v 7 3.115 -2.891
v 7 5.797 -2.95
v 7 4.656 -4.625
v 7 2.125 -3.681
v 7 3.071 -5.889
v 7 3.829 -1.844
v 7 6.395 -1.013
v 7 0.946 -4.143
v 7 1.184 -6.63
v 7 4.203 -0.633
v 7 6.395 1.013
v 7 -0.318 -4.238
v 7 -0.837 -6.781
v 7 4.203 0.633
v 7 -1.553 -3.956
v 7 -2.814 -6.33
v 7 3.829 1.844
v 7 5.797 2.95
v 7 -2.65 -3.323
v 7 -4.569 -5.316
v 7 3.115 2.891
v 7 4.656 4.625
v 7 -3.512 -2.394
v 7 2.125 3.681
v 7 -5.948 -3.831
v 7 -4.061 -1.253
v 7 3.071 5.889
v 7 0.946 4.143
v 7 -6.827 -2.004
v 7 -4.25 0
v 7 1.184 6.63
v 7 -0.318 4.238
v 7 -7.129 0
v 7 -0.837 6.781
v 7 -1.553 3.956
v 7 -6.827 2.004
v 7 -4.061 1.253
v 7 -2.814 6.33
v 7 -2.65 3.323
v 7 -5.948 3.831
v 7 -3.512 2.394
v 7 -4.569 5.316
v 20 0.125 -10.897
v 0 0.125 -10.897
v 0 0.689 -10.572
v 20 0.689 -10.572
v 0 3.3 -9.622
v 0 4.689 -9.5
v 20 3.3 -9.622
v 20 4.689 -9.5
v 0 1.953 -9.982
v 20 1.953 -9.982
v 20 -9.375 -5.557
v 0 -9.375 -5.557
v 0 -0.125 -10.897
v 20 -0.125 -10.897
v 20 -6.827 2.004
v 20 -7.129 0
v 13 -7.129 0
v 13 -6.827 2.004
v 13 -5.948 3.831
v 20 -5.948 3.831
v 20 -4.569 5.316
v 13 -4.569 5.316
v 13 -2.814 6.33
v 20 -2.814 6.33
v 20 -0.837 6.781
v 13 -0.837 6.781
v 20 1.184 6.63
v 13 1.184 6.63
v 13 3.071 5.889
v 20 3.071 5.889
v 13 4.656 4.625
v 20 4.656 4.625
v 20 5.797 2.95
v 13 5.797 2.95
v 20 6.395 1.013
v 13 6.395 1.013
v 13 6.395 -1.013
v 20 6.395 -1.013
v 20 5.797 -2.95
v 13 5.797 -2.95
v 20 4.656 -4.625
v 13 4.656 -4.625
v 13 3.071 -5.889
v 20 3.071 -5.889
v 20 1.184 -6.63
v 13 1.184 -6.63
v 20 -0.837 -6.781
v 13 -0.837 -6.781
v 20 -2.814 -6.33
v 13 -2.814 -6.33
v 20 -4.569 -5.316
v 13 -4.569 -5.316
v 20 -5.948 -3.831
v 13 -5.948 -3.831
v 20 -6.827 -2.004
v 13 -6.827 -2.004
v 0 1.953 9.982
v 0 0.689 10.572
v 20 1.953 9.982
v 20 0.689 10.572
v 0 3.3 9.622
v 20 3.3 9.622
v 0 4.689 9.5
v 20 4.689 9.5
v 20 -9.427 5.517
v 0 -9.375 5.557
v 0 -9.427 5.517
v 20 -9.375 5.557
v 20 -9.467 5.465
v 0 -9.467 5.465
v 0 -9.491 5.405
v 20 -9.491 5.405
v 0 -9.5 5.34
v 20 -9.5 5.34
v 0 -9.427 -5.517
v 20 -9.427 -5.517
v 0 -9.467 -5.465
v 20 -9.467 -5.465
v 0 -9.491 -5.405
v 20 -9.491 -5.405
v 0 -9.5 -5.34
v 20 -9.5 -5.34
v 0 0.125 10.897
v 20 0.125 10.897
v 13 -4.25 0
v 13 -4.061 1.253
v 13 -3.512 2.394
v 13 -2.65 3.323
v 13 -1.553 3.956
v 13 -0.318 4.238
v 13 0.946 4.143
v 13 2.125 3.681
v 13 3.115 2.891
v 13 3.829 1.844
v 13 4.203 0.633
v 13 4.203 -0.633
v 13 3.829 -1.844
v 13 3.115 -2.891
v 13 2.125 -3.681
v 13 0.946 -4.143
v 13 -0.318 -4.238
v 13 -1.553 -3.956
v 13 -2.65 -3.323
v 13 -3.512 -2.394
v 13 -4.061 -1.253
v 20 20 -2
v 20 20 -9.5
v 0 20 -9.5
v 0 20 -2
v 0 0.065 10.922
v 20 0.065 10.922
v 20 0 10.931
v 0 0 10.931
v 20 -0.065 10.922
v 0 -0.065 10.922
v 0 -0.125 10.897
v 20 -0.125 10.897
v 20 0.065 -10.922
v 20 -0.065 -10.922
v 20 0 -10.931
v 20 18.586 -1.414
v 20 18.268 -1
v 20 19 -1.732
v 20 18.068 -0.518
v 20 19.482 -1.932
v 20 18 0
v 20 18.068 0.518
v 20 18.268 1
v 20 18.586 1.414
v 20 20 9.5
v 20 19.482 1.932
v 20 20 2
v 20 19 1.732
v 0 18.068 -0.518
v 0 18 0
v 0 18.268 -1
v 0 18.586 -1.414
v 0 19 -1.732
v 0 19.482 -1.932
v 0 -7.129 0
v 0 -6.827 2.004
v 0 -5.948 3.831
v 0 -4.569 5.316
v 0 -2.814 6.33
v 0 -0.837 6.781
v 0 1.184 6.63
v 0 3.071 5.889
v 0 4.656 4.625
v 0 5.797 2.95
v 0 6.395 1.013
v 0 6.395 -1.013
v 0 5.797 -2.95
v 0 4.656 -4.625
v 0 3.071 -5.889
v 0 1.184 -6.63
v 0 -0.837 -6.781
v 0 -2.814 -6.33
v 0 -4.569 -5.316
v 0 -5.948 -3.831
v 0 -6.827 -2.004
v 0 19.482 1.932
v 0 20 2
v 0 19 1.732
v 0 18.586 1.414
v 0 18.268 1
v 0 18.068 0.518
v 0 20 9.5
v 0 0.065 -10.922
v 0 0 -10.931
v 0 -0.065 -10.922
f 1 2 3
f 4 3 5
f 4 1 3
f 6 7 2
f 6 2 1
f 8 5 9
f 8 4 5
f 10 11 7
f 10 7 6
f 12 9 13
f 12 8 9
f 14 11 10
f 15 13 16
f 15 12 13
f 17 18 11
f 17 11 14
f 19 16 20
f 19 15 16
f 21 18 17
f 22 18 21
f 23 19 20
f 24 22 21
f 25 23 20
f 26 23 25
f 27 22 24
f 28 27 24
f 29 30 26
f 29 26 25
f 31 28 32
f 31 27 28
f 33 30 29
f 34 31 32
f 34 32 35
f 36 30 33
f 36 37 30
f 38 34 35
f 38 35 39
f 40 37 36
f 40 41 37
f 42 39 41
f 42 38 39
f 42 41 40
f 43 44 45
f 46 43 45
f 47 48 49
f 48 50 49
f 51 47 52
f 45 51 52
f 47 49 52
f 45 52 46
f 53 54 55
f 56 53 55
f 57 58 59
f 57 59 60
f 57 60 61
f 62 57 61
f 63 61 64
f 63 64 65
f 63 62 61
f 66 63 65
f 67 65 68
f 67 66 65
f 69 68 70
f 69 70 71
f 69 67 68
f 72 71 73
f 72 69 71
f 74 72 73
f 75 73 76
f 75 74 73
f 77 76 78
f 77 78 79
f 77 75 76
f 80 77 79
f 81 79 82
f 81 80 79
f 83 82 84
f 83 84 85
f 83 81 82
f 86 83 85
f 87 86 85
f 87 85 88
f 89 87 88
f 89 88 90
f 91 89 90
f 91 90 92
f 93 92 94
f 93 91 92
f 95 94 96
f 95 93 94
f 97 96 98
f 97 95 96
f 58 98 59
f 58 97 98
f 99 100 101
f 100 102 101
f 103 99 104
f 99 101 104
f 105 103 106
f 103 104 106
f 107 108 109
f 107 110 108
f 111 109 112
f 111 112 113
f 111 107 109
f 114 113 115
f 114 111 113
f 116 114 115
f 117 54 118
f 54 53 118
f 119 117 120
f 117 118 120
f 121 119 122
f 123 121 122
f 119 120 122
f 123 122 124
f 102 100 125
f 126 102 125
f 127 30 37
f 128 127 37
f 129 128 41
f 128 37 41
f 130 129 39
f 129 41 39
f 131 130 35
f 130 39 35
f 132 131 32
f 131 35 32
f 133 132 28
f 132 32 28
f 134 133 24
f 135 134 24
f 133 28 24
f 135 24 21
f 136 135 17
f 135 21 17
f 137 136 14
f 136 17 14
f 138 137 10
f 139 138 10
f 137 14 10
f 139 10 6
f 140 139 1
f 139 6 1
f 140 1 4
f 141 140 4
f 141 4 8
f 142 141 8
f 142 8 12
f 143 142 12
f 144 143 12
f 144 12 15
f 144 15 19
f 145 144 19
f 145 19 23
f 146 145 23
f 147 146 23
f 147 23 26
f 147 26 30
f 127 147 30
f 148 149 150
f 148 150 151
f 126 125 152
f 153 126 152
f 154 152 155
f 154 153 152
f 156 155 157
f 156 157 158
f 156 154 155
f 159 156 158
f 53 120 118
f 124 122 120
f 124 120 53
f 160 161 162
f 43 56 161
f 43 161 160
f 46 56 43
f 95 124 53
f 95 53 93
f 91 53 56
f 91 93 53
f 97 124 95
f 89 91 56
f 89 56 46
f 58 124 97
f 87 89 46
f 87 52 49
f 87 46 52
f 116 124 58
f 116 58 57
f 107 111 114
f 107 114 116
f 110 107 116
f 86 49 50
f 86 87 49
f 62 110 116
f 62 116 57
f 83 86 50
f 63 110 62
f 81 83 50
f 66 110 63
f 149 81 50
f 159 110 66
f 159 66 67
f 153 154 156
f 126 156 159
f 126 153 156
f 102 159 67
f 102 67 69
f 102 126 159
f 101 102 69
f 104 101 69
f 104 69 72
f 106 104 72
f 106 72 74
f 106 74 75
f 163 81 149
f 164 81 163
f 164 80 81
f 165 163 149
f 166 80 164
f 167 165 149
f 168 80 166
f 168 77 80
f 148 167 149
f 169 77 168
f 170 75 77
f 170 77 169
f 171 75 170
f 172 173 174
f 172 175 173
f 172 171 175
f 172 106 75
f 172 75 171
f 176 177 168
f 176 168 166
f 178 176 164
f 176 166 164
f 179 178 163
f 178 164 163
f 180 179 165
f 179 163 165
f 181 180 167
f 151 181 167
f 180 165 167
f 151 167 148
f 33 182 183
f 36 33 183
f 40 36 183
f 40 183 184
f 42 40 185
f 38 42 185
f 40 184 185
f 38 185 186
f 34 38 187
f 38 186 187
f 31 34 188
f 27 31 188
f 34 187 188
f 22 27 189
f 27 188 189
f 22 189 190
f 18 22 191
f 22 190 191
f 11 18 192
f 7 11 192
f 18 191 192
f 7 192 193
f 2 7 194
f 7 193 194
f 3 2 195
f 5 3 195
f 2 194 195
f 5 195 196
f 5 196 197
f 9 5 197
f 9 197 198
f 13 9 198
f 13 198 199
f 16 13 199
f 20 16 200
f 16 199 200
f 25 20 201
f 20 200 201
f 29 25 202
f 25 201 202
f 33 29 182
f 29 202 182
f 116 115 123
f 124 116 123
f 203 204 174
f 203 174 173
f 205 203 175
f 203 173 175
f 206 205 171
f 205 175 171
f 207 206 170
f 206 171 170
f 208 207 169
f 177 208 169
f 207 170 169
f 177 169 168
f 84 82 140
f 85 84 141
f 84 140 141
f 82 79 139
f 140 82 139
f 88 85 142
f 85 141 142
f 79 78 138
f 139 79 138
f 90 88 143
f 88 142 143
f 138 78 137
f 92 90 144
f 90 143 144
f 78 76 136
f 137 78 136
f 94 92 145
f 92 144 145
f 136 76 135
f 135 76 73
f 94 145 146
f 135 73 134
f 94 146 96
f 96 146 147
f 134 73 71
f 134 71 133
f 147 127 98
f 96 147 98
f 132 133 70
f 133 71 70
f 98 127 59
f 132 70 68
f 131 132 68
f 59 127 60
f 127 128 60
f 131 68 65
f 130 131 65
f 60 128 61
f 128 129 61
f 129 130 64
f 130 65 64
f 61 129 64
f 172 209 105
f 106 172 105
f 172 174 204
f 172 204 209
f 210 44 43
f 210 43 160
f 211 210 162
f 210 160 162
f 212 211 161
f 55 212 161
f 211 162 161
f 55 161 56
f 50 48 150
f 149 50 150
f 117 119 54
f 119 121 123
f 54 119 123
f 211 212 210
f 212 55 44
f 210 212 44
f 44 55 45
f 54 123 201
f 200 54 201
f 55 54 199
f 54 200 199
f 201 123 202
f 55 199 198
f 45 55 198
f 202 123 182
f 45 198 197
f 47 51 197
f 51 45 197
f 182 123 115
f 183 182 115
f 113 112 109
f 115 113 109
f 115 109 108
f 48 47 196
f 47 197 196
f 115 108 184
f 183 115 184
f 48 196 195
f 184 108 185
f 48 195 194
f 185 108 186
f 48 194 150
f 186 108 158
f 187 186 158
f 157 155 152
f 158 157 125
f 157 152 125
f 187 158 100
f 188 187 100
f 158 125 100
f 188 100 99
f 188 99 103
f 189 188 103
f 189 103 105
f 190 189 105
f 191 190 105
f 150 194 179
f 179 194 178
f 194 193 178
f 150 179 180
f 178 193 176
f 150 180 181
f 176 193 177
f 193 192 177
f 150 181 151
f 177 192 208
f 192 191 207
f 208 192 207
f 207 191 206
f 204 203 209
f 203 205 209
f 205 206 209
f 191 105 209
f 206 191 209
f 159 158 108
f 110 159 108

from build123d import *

# Parameters (mm, degrees)
F1_DEPTH  = 20
F4_R      = 4.25
F5_DEPTH  = 20.001
F6_R      = 6.8
F6_R_2    = 4.25
F7_DEPTH  = 7
F10_R     = 8
F12_DEPTH = 20.001
F13_R     = 0.25


# Not quite as in the source:
# - a feature names something its author has since deleted; it is built from what else it names


with BuildPart() as f1:
    # F0 (on Right) → F1 (new body)
    with BuildSketch(Plane.YZ):
        Polygon((2.5455173281, 9.5), (0, 10.9696551146), (-9.5, 5.4848275573), (-9.5, -5.4848275573), (0, -10.9696551146), (2.5455173281, -9.5), (9.5, -5.4848275573), (9.5, 0), (9.5, 5.4848275573), align=None)
        Polygon((20, 9.5), (2.5455173281, 9.5), (9.5, 5.4848275573), (9.5, 0), (20, 0), align=None)
        Polygon((20, 0), (9.5, 0), (9.5, -5.4848275573), (2.5455173281, -9.5), (20, -9.5), align=None)
    extrude(amount=F1_DEPTH)

    # F4 (on face) → F5 (cut, through all)
    with BuildSketch(Plane(origin=(0, 0, 0), x_dir=(0, -1, 0), z_dir=(-1, 0, 0))):
        Circle(F4_R)
    extrude(amount=-F5_DEPTH, mode=Mode.SUBTRACT)


with BuildPart() as f7:
    # F6 (on face) → F7 (new body)
    with BuildSketch(Plane(origin=(0, 0, 0), x_dir=(0, -1, 0), z_dir=(-1, 0, 0))):
        with Locations((0.3292050309, 0)):
            Circle(F6_R)
        Circle(F6_R_2, mode=Mode.SUBTRACT)
        Circle(F6_R_2)
    extrude(amount=-F7_DEPTH)


with BuildPart() as f8_1:
    # F8: instance of F7
    add(f7.part.mirror(Plane(origin=(10, 5.820047307, 0), x_dir=(0, 1, 0), z_dir=(1, 0, 0))))


with BuildPart() as f1_1:
    add(f1.part)

    # F9: cut F7, F8_1
    add(f7.part, mode=Mode.SUBTRACT)
    add(f8_1.part, mode=Mode.SUBTRACT)

    # F10
    f10_edges = [f1_1.edges().sort_by_distance(p)[0] for p in [
        (10, 2.545517, -9.5),
        (10, 2.545517, 9.5),
    ]]
    fillet(f10_edges, radius=F10_R)

    # F11 (on face) → F12 (cut, through all)
    with BuildSketch(Plane.YZ.offset(20)):
        with BuildLine():
            Line((20, 0), (20, 2))
            ThreePointArc((20, 2), (18.5857864376, 1.4142135624), (18, 0))
            Line((18, 0), (20, 0))
        make_face()
        with BuildLine():
            ThreePointArc((18, 0), (18.5857864376, -1.4142135624), (20, -2))
            Line((20, -2), (20, 0))
            Line((20, 0), (18, 0))
        make_face()
        with BuildLine():
            ThreePointArc((20, -2), (21.4142135624, -1.4142135624), (22, 0))
            ThreePointArc((22, 0), (21.4142135624, 1.4142135624), (20, 2))
            Line((20, 2), (20, 0))
            Line((20, 0), (20, -2))
        make_face()
    extrude(amount=-F12_DEPTH, mode=Mode.SUBTRACT)

    # F13
    f13_edges = [f1_1.edges().sort_by_distance(p)[0] for p in [
        (10, -9.5, -5.484828),
        (10, -9.5, 5.484828),
        (10, 0, 10.969655),
        (10, 0, -10.969655),
    ]]
    fillet(f13_edges, radius=F13_R)


solid = f1_1.part
